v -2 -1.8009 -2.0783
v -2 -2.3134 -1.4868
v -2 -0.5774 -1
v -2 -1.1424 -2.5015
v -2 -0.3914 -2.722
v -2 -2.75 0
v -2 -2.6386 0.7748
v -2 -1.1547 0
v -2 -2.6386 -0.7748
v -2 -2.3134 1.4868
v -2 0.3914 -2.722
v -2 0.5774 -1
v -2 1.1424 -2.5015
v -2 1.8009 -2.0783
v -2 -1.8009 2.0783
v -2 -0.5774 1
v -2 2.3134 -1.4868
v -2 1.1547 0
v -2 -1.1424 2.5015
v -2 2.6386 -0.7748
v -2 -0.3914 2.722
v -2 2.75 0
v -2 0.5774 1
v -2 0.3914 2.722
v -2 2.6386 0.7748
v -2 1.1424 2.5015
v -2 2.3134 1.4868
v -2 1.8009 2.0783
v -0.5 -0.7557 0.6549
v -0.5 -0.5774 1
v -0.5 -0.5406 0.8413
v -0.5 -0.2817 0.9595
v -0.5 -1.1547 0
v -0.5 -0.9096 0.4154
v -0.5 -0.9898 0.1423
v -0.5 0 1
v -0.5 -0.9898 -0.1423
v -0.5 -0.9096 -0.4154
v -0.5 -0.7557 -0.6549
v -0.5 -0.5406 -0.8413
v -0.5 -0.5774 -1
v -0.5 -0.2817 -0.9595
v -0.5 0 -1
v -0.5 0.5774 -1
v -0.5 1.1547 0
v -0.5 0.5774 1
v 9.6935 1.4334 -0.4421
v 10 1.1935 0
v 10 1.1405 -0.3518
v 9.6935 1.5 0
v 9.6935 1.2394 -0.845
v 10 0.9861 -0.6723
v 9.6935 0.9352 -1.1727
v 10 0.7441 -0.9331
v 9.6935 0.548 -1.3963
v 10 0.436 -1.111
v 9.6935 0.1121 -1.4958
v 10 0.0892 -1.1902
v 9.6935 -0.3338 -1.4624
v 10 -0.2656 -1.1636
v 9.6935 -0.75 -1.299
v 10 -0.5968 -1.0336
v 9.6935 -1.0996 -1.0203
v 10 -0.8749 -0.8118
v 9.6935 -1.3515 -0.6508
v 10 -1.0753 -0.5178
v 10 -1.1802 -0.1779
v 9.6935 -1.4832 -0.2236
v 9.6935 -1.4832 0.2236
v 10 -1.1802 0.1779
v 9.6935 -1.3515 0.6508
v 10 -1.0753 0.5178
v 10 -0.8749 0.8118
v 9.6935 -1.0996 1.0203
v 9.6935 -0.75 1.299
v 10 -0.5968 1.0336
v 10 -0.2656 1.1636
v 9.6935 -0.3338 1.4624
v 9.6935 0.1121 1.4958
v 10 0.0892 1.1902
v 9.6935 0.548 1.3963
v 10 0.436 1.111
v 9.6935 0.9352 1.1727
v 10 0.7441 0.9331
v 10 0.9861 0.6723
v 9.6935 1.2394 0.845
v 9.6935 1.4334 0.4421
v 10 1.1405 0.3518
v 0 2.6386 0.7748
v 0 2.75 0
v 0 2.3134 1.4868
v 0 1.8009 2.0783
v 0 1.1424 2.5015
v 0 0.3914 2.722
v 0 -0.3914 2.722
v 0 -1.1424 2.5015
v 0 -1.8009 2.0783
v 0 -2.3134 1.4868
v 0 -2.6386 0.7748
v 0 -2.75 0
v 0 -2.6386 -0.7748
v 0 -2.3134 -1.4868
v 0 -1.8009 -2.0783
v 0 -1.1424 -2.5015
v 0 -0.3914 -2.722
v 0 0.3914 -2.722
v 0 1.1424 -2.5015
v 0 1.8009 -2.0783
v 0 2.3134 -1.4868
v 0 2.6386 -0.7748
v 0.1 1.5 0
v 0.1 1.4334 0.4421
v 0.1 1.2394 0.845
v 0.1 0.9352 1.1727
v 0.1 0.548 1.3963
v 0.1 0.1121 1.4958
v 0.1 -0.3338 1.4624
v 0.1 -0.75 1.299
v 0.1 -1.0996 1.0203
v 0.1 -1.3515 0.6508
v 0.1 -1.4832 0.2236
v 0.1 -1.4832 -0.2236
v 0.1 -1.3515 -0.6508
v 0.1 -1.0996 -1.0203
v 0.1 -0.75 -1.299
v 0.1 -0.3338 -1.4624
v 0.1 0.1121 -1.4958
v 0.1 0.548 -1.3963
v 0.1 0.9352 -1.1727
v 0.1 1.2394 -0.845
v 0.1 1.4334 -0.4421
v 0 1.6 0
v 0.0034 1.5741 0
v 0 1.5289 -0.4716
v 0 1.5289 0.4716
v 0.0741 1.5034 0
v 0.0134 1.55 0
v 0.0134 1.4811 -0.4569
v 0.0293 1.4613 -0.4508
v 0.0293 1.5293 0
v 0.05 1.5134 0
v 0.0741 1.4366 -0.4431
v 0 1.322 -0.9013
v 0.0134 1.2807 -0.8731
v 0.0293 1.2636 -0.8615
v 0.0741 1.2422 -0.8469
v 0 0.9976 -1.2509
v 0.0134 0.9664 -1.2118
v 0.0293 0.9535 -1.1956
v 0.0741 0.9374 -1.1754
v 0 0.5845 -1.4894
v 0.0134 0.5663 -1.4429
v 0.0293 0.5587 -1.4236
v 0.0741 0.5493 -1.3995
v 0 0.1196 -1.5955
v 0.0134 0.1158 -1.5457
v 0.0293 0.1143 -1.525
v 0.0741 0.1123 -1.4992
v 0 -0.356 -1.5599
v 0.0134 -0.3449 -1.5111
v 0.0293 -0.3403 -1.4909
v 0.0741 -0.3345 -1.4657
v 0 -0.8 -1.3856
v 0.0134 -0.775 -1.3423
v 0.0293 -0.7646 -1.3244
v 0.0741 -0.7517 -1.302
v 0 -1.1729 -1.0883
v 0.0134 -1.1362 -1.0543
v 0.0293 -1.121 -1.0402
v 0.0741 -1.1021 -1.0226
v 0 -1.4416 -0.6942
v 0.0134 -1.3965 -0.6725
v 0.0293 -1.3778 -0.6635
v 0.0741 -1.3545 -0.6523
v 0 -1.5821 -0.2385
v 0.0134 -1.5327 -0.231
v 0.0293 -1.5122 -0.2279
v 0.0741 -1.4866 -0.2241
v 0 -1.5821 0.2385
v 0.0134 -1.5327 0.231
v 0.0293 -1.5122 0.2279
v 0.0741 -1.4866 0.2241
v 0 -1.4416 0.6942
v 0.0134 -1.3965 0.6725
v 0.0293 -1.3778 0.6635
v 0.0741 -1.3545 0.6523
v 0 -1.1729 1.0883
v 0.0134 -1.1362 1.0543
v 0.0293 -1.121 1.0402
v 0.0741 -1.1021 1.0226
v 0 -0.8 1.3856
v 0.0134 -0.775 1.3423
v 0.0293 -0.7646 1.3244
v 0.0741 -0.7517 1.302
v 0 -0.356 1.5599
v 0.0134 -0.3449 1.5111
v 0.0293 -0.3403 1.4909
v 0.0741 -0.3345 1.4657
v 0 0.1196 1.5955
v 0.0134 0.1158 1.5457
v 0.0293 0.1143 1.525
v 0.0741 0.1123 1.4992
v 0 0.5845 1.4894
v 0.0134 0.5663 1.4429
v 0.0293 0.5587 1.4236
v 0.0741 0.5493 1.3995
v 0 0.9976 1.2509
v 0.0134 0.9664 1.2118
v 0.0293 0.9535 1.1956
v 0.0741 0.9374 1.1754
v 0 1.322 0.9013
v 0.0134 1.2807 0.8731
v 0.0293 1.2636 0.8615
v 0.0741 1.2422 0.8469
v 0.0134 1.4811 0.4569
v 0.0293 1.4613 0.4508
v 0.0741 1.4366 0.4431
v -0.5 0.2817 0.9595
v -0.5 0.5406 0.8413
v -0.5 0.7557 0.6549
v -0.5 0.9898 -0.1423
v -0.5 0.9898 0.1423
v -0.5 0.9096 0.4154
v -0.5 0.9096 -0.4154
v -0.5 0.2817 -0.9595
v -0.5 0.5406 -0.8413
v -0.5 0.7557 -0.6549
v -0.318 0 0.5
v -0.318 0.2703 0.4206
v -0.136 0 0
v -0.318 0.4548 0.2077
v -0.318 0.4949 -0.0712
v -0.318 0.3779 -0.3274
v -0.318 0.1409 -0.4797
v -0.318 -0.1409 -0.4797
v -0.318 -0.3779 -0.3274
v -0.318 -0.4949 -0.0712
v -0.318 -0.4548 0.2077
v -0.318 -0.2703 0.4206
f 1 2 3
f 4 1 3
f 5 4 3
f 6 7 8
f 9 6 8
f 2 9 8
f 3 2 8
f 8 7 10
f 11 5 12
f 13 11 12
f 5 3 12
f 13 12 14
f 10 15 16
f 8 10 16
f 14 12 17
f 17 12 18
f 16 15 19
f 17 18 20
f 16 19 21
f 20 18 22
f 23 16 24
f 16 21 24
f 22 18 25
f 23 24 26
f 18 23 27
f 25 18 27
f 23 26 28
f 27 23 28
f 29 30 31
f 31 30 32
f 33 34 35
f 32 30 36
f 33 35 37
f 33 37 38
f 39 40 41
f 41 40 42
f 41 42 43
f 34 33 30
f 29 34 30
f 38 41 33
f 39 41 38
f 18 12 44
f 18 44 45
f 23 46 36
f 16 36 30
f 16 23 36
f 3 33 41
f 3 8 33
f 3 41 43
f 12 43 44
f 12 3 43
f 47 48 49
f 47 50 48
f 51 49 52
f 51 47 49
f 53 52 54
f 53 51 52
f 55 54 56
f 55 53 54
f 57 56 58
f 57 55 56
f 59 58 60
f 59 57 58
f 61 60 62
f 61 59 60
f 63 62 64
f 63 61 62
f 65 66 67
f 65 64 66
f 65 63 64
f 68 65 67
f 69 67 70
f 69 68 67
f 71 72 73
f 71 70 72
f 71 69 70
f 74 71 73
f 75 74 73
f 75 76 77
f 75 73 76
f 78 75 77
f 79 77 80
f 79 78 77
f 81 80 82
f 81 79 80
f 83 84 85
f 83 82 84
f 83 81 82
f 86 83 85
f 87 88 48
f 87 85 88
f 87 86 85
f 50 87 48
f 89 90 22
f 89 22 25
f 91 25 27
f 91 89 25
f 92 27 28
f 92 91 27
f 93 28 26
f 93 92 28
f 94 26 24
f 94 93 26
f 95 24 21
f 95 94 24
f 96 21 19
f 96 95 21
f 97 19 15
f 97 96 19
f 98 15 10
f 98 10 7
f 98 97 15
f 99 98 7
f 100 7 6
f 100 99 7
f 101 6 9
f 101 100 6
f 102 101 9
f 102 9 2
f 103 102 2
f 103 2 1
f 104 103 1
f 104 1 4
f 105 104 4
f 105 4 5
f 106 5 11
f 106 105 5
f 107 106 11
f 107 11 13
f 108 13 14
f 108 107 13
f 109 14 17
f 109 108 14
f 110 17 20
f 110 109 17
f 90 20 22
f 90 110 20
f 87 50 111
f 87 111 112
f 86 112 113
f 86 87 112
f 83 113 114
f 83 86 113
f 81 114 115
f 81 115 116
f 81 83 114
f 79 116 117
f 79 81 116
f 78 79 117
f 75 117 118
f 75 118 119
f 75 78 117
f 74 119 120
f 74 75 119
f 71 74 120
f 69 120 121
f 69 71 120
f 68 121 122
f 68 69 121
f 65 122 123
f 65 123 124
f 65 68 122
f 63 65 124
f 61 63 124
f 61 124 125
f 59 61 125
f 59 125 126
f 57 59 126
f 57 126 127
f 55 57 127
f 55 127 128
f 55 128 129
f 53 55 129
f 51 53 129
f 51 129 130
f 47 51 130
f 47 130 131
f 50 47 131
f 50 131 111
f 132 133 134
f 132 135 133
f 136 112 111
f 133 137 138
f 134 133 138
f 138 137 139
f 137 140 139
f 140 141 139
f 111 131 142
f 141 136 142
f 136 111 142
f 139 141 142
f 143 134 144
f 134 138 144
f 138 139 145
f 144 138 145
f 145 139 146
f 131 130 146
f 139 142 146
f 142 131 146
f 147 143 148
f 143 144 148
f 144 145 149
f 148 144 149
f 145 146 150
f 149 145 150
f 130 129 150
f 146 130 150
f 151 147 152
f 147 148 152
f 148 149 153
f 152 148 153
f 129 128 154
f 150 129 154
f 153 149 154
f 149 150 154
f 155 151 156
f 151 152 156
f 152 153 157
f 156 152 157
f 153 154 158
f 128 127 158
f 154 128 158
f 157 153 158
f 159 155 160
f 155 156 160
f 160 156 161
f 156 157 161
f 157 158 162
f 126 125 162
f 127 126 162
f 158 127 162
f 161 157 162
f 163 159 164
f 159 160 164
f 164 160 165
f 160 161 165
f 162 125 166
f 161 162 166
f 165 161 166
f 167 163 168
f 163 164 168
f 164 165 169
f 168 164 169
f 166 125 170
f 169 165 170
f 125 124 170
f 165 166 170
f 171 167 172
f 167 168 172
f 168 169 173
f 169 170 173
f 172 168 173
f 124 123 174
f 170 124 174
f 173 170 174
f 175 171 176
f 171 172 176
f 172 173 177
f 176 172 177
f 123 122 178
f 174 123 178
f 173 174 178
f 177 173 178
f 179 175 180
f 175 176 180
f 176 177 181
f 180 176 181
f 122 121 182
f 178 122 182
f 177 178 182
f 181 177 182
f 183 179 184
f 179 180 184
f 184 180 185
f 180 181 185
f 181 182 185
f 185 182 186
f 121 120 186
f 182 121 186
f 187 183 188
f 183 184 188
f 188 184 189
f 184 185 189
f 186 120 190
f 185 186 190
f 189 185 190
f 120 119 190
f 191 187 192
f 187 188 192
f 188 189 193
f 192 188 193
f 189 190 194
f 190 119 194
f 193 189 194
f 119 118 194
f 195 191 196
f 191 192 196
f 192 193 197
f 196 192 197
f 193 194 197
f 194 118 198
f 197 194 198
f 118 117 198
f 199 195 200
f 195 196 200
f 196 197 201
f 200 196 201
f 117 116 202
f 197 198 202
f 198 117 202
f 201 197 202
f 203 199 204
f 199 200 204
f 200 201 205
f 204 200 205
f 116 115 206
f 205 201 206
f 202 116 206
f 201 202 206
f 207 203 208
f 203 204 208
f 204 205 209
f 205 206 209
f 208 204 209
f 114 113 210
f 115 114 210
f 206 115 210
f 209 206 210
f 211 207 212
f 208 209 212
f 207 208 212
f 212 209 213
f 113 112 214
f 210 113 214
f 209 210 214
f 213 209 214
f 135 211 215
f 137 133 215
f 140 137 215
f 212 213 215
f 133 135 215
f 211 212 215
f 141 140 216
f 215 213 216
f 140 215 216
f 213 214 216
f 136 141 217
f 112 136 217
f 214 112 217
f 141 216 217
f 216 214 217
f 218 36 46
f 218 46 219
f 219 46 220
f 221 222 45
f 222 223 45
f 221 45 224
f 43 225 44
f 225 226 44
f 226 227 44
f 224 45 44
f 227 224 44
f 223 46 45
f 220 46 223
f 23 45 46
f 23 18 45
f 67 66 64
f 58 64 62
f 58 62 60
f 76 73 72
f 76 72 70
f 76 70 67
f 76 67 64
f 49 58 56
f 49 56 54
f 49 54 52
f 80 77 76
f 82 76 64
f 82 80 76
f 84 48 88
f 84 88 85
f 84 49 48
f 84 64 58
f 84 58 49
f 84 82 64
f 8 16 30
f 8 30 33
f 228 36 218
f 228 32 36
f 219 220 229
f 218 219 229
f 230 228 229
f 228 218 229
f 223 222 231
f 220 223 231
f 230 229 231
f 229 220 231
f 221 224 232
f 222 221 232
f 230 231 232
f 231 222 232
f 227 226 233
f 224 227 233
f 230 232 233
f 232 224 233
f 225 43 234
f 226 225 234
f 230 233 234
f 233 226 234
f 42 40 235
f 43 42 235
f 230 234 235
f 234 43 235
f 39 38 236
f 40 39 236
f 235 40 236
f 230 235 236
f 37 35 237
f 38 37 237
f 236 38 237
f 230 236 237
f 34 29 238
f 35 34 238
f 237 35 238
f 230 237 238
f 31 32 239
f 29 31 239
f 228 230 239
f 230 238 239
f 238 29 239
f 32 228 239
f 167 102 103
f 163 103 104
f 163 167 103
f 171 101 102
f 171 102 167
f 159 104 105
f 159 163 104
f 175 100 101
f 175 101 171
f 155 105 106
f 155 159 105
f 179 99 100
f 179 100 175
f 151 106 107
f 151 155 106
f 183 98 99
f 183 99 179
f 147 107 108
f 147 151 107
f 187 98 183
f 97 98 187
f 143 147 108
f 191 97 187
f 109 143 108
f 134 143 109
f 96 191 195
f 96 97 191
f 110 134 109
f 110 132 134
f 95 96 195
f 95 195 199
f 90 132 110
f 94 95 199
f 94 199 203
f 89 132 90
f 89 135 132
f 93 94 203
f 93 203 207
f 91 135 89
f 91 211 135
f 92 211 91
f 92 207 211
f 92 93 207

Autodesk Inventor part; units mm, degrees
sketch "Sketch_1" plane through (0, 0, 0) normal (0, 0, 1) x (1, 0, 0)
  line L0 (10, 0) -> (-2, 0)
  line L1 (-2, 0) -> (-2, 2.75)
  line L2 (-2, 2.75) -> (0, 2.75)
  line L3 (0, 2.75) -> (0, 1.6)
  arc A0 (0, 1.6) -> (0.1, 1.5) centre (0.1, 1.6) ccw
  line L4 (0.1, 1.5) -> (9.6935, 1.5)
  line L5 (9.6935, 1.5) -> (10, 1.1935)
  line L6 (10, 1.1935) -> (10, 0)
  line L7 (10, 0) -> (-2, 0)
revolve "Revolution1" add sketch "Sketch_1" angle 360 about axis through (10, 0, 0) along (1, 0, 0)
thread "Thread1" size "M3x0.5" class "6g" standard "ISO Metric profile" length 9.5 offset 0.4
sketch "Sketch2" plane through (-2, 0, 0) normal (-1, 0, 0) x (0, 0, 1)
  point P0 (0, 0)
hole "Hole1" at (-2, 0, 0) direction (1, 0, 0) diameter 2 depth 1.5 tip angle 140
sketch "Sketch_3" plane through (-2, 0, 0) normal (1, 0, 0) x (0, 0, -1)
  line L0 (-1, 0.5774) -> (-1, -0.5774)
  line L1 (-1, -0.5774) -> (0, -1.1547)
  line L2 (0, -1.1547) -> (1, -0.5774)
  line L3 (1, -0.5774) -> (1, 0.5774)
  line L4 (1, 0.5774) -> (0, 1.1547)
  line L5 (0, 1.1547) -> (-1, 0.5774)
extrude "Extrusion1" cut sketch "Sketch_3" along normal blind 1.5
ref_plane "bolt_XY" through (0, 0, 0) normal (1, 0, 0) x (0, 0, -1)
ref_plane "bolt_YZ" through (0, 0, 0) normal (0, 0, -1) x (0, 1, 0)
ref_plane "bolt_ZX" through (0, 0, 0) normal (0, 1, 0) x (1, 0, 0)
ref_plane "bolt_to_nut_XY" through (10, 0, 0) normal (1, 0, 0) x (0, 0, -1)
ref_plane "bolt_to_nut_YZ" through (10, 0, 0) normal (0, 0, -1) x (0, 1, 0)
ref_plane "bolt_to_nut_ZX" through (10, 0, 0) normal (0, 1, 0) x (1, 0, 0)
properties part number "CBS3-10"
